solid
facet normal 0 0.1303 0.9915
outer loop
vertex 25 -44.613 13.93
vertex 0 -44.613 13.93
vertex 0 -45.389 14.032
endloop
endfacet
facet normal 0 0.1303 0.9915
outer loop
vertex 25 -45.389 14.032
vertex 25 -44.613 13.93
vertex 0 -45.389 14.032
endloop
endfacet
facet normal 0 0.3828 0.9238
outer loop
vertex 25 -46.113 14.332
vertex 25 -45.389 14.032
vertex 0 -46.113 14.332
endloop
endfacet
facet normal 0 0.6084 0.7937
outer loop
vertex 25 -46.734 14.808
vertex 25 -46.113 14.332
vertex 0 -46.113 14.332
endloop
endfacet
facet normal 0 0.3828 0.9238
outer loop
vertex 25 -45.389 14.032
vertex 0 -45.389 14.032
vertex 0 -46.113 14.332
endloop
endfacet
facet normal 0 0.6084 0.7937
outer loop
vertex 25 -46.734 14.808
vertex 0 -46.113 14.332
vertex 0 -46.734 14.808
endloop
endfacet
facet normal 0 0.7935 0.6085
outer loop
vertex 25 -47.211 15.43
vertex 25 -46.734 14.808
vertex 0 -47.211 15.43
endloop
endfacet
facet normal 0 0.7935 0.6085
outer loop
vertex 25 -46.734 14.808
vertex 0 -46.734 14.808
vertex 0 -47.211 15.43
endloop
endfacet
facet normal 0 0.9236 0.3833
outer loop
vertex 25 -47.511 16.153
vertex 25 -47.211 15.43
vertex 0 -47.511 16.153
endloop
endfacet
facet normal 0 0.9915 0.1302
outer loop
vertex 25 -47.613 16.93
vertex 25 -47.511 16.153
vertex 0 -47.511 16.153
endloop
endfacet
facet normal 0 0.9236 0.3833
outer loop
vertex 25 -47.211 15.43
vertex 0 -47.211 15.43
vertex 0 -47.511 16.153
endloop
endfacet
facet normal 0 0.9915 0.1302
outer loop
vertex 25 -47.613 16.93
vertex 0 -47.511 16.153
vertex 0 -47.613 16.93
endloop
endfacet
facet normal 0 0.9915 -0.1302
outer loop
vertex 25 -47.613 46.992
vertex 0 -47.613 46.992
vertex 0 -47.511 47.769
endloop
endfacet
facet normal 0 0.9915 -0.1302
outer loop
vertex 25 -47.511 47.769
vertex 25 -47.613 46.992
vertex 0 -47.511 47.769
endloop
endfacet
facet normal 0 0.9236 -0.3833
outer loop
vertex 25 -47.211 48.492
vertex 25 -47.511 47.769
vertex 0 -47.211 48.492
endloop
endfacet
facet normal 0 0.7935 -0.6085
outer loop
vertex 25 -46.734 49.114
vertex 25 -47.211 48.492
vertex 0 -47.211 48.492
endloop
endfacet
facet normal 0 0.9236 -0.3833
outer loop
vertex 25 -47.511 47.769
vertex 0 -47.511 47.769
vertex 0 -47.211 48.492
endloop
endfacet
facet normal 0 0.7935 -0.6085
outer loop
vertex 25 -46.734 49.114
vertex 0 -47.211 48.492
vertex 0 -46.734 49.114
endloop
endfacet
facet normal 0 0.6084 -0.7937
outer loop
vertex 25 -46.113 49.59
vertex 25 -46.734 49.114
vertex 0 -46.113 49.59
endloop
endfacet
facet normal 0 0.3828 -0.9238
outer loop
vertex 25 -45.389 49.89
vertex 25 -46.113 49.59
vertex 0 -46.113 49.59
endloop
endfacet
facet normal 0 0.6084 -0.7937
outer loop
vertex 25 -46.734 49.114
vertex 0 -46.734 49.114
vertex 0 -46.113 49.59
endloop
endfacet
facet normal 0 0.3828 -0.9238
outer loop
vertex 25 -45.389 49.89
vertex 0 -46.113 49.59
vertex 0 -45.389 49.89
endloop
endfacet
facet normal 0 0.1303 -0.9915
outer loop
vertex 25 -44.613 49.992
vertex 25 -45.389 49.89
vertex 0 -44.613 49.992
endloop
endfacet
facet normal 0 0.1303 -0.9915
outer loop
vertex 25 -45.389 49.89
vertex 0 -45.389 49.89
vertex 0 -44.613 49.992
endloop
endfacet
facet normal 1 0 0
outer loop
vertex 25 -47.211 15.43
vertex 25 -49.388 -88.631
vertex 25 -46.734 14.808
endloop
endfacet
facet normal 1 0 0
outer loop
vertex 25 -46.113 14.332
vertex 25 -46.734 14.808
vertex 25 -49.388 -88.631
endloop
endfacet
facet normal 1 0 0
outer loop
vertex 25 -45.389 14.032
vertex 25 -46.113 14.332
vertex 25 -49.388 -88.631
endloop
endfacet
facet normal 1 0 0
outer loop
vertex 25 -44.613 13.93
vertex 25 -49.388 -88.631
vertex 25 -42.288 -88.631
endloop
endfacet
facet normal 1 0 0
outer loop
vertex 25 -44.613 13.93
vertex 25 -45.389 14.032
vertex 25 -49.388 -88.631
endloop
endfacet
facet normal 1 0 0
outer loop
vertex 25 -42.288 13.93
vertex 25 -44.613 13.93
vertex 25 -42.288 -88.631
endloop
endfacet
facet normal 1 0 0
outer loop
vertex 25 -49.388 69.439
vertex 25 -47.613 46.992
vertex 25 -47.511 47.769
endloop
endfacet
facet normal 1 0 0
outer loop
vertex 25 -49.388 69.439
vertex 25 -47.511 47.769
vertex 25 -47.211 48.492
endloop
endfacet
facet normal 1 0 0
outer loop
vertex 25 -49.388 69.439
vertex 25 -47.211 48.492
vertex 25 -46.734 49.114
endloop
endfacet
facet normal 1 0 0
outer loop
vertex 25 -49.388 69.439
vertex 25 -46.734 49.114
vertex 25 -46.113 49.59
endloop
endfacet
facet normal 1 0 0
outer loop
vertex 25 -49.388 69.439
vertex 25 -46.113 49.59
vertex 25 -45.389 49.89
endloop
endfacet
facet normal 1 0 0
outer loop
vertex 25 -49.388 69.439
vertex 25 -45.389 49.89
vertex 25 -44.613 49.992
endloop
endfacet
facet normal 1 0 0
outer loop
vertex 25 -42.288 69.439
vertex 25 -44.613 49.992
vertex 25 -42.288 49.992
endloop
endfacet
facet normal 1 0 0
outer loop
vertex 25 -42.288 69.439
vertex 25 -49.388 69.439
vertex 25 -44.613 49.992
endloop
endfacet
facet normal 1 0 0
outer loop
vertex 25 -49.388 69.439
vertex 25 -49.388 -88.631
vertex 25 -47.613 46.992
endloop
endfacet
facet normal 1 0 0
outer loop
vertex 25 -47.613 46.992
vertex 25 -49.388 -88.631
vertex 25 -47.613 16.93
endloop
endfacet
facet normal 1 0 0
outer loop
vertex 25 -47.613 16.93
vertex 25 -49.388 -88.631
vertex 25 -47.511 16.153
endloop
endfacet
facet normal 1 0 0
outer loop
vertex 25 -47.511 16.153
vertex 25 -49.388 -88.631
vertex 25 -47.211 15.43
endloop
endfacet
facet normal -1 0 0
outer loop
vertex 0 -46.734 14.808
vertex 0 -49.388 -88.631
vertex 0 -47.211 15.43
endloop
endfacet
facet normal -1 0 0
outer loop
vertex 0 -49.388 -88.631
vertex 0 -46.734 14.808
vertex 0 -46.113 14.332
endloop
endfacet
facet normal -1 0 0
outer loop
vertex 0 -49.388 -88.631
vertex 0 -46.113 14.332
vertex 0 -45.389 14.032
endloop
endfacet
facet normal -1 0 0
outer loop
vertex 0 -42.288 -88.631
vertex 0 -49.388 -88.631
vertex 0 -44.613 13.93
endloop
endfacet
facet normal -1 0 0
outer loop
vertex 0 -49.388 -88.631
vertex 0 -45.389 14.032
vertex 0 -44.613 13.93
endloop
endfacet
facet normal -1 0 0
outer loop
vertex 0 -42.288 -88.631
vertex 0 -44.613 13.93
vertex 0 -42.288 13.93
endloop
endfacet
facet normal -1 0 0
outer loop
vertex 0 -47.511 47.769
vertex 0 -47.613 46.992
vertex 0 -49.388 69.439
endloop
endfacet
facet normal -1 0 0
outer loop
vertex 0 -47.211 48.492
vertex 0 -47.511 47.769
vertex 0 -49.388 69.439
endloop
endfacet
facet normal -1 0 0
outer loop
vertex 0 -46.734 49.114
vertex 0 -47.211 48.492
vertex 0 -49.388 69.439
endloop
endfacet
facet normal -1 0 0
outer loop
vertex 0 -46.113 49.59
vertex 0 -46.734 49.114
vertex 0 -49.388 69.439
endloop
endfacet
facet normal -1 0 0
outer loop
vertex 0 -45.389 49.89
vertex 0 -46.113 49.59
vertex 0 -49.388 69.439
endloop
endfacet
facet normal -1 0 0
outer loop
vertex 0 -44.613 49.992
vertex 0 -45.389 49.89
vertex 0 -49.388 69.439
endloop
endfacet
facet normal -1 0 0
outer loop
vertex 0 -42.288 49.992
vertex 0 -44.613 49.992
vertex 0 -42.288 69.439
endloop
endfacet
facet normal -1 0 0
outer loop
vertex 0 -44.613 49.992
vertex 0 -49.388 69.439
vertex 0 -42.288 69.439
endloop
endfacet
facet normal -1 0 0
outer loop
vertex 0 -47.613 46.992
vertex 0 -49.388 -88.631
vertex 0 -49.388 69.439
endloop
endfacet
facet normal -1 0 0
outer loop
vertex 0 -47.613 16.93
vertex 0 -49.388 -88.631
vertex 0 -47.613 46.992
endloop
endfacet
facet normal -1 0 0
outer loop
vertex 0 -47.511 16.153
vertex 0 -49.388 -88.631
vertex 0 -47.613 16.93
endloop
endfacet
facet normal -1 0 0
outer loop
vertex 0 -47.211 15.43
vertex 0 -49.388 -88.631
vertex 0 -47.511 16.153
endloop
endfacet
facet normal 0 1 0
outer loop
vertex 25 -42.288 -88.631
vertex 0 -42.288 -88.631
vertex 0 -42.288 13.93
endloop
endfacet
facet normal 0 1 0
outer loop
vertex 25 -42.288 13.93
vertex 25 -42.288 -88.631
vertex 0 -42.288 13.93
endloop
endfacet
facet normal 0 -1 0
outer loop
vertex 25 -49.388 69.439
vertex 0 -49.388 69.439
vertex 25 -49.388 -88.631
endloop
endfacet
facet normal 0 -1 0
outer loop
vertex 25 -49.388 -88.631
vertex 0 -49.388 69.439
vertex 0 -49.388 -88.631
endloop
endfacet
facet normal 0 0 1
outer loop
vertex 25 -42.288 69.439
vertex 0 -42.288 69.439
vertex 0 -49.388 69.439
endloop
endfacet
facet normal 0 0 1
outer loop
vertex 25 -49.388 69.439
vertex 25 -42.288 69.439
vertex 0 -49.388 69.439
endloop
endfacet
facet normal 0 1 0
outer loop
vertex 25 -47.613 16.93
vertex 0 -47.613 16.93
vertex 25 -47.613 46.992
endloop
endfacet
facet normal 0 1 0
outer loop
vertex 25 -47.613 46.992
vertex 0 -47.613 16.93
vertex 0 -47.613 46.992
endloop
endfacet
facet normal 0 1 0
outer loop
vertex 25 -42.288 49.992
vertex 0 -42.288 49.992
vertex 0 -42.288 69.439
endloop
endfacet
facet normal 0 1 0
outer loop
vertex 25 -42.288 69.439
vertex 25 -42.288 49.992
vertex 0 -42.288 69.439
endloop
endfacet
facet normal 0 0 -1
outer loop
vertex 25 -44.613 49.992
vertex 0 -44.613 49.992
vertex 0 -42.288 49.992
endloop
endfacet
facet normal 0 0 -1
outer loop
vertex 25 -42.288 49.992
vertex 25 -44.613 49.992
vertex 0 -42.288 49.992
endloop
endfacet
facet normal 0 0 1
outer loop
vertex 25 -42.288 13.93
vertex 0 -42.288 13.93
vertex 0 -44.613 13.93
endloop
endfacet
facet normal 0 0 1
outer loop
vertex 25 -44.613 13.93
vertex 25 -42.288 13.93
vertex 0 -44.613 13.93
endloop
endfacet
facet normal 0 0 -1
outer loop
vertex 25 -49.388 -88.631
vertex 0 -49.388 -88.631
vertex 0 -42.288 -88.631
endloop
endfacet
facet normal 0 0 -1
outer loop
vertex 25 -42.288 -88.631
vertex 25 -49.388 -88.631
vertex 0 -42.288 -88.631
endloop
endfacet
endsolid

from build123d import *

# Parameters (mm, degrees)
F1_DEPTH = 25


with BuildPart() as f1:
    # F0 (on Right) → F1 (new body)
    with BuildSketch(Plane.YZ):
        with BuildLine():
            Line((-42.287987, 69.438771), (-49.387987, 69.438771))
            Line((-49.387987, 69.438771), (-49.387987, -88.631229))
            Line((-49.387987, -88.631229), (-42.287987, -88.631229))
            Line((-42.287987, -88.631229), (-42.287987, 13.929646))
            Line((-42.287987, 13.929646), (-44.612987, 13.929646))
            ThreePointArc((-44.612987, 13.929646), (-46.734308, 14.808326), (-47.612987, 16.929646))
            Line((-47.612987, 16.929646), (-47.612987, 46.992207))
            ThreePointArc((-47.612987, 46.992207), (-46.734308, 49.113528), (-44.612987, 49.992207))
            Line((-44.612987, 49.992207), (-42.287987, 49.992207))
            Line((-42.287987, 49.992207), (-42.287987, 69.438771))
        make_face()
    extrude(amount=F1_DEPTH)


solid = f1.part
